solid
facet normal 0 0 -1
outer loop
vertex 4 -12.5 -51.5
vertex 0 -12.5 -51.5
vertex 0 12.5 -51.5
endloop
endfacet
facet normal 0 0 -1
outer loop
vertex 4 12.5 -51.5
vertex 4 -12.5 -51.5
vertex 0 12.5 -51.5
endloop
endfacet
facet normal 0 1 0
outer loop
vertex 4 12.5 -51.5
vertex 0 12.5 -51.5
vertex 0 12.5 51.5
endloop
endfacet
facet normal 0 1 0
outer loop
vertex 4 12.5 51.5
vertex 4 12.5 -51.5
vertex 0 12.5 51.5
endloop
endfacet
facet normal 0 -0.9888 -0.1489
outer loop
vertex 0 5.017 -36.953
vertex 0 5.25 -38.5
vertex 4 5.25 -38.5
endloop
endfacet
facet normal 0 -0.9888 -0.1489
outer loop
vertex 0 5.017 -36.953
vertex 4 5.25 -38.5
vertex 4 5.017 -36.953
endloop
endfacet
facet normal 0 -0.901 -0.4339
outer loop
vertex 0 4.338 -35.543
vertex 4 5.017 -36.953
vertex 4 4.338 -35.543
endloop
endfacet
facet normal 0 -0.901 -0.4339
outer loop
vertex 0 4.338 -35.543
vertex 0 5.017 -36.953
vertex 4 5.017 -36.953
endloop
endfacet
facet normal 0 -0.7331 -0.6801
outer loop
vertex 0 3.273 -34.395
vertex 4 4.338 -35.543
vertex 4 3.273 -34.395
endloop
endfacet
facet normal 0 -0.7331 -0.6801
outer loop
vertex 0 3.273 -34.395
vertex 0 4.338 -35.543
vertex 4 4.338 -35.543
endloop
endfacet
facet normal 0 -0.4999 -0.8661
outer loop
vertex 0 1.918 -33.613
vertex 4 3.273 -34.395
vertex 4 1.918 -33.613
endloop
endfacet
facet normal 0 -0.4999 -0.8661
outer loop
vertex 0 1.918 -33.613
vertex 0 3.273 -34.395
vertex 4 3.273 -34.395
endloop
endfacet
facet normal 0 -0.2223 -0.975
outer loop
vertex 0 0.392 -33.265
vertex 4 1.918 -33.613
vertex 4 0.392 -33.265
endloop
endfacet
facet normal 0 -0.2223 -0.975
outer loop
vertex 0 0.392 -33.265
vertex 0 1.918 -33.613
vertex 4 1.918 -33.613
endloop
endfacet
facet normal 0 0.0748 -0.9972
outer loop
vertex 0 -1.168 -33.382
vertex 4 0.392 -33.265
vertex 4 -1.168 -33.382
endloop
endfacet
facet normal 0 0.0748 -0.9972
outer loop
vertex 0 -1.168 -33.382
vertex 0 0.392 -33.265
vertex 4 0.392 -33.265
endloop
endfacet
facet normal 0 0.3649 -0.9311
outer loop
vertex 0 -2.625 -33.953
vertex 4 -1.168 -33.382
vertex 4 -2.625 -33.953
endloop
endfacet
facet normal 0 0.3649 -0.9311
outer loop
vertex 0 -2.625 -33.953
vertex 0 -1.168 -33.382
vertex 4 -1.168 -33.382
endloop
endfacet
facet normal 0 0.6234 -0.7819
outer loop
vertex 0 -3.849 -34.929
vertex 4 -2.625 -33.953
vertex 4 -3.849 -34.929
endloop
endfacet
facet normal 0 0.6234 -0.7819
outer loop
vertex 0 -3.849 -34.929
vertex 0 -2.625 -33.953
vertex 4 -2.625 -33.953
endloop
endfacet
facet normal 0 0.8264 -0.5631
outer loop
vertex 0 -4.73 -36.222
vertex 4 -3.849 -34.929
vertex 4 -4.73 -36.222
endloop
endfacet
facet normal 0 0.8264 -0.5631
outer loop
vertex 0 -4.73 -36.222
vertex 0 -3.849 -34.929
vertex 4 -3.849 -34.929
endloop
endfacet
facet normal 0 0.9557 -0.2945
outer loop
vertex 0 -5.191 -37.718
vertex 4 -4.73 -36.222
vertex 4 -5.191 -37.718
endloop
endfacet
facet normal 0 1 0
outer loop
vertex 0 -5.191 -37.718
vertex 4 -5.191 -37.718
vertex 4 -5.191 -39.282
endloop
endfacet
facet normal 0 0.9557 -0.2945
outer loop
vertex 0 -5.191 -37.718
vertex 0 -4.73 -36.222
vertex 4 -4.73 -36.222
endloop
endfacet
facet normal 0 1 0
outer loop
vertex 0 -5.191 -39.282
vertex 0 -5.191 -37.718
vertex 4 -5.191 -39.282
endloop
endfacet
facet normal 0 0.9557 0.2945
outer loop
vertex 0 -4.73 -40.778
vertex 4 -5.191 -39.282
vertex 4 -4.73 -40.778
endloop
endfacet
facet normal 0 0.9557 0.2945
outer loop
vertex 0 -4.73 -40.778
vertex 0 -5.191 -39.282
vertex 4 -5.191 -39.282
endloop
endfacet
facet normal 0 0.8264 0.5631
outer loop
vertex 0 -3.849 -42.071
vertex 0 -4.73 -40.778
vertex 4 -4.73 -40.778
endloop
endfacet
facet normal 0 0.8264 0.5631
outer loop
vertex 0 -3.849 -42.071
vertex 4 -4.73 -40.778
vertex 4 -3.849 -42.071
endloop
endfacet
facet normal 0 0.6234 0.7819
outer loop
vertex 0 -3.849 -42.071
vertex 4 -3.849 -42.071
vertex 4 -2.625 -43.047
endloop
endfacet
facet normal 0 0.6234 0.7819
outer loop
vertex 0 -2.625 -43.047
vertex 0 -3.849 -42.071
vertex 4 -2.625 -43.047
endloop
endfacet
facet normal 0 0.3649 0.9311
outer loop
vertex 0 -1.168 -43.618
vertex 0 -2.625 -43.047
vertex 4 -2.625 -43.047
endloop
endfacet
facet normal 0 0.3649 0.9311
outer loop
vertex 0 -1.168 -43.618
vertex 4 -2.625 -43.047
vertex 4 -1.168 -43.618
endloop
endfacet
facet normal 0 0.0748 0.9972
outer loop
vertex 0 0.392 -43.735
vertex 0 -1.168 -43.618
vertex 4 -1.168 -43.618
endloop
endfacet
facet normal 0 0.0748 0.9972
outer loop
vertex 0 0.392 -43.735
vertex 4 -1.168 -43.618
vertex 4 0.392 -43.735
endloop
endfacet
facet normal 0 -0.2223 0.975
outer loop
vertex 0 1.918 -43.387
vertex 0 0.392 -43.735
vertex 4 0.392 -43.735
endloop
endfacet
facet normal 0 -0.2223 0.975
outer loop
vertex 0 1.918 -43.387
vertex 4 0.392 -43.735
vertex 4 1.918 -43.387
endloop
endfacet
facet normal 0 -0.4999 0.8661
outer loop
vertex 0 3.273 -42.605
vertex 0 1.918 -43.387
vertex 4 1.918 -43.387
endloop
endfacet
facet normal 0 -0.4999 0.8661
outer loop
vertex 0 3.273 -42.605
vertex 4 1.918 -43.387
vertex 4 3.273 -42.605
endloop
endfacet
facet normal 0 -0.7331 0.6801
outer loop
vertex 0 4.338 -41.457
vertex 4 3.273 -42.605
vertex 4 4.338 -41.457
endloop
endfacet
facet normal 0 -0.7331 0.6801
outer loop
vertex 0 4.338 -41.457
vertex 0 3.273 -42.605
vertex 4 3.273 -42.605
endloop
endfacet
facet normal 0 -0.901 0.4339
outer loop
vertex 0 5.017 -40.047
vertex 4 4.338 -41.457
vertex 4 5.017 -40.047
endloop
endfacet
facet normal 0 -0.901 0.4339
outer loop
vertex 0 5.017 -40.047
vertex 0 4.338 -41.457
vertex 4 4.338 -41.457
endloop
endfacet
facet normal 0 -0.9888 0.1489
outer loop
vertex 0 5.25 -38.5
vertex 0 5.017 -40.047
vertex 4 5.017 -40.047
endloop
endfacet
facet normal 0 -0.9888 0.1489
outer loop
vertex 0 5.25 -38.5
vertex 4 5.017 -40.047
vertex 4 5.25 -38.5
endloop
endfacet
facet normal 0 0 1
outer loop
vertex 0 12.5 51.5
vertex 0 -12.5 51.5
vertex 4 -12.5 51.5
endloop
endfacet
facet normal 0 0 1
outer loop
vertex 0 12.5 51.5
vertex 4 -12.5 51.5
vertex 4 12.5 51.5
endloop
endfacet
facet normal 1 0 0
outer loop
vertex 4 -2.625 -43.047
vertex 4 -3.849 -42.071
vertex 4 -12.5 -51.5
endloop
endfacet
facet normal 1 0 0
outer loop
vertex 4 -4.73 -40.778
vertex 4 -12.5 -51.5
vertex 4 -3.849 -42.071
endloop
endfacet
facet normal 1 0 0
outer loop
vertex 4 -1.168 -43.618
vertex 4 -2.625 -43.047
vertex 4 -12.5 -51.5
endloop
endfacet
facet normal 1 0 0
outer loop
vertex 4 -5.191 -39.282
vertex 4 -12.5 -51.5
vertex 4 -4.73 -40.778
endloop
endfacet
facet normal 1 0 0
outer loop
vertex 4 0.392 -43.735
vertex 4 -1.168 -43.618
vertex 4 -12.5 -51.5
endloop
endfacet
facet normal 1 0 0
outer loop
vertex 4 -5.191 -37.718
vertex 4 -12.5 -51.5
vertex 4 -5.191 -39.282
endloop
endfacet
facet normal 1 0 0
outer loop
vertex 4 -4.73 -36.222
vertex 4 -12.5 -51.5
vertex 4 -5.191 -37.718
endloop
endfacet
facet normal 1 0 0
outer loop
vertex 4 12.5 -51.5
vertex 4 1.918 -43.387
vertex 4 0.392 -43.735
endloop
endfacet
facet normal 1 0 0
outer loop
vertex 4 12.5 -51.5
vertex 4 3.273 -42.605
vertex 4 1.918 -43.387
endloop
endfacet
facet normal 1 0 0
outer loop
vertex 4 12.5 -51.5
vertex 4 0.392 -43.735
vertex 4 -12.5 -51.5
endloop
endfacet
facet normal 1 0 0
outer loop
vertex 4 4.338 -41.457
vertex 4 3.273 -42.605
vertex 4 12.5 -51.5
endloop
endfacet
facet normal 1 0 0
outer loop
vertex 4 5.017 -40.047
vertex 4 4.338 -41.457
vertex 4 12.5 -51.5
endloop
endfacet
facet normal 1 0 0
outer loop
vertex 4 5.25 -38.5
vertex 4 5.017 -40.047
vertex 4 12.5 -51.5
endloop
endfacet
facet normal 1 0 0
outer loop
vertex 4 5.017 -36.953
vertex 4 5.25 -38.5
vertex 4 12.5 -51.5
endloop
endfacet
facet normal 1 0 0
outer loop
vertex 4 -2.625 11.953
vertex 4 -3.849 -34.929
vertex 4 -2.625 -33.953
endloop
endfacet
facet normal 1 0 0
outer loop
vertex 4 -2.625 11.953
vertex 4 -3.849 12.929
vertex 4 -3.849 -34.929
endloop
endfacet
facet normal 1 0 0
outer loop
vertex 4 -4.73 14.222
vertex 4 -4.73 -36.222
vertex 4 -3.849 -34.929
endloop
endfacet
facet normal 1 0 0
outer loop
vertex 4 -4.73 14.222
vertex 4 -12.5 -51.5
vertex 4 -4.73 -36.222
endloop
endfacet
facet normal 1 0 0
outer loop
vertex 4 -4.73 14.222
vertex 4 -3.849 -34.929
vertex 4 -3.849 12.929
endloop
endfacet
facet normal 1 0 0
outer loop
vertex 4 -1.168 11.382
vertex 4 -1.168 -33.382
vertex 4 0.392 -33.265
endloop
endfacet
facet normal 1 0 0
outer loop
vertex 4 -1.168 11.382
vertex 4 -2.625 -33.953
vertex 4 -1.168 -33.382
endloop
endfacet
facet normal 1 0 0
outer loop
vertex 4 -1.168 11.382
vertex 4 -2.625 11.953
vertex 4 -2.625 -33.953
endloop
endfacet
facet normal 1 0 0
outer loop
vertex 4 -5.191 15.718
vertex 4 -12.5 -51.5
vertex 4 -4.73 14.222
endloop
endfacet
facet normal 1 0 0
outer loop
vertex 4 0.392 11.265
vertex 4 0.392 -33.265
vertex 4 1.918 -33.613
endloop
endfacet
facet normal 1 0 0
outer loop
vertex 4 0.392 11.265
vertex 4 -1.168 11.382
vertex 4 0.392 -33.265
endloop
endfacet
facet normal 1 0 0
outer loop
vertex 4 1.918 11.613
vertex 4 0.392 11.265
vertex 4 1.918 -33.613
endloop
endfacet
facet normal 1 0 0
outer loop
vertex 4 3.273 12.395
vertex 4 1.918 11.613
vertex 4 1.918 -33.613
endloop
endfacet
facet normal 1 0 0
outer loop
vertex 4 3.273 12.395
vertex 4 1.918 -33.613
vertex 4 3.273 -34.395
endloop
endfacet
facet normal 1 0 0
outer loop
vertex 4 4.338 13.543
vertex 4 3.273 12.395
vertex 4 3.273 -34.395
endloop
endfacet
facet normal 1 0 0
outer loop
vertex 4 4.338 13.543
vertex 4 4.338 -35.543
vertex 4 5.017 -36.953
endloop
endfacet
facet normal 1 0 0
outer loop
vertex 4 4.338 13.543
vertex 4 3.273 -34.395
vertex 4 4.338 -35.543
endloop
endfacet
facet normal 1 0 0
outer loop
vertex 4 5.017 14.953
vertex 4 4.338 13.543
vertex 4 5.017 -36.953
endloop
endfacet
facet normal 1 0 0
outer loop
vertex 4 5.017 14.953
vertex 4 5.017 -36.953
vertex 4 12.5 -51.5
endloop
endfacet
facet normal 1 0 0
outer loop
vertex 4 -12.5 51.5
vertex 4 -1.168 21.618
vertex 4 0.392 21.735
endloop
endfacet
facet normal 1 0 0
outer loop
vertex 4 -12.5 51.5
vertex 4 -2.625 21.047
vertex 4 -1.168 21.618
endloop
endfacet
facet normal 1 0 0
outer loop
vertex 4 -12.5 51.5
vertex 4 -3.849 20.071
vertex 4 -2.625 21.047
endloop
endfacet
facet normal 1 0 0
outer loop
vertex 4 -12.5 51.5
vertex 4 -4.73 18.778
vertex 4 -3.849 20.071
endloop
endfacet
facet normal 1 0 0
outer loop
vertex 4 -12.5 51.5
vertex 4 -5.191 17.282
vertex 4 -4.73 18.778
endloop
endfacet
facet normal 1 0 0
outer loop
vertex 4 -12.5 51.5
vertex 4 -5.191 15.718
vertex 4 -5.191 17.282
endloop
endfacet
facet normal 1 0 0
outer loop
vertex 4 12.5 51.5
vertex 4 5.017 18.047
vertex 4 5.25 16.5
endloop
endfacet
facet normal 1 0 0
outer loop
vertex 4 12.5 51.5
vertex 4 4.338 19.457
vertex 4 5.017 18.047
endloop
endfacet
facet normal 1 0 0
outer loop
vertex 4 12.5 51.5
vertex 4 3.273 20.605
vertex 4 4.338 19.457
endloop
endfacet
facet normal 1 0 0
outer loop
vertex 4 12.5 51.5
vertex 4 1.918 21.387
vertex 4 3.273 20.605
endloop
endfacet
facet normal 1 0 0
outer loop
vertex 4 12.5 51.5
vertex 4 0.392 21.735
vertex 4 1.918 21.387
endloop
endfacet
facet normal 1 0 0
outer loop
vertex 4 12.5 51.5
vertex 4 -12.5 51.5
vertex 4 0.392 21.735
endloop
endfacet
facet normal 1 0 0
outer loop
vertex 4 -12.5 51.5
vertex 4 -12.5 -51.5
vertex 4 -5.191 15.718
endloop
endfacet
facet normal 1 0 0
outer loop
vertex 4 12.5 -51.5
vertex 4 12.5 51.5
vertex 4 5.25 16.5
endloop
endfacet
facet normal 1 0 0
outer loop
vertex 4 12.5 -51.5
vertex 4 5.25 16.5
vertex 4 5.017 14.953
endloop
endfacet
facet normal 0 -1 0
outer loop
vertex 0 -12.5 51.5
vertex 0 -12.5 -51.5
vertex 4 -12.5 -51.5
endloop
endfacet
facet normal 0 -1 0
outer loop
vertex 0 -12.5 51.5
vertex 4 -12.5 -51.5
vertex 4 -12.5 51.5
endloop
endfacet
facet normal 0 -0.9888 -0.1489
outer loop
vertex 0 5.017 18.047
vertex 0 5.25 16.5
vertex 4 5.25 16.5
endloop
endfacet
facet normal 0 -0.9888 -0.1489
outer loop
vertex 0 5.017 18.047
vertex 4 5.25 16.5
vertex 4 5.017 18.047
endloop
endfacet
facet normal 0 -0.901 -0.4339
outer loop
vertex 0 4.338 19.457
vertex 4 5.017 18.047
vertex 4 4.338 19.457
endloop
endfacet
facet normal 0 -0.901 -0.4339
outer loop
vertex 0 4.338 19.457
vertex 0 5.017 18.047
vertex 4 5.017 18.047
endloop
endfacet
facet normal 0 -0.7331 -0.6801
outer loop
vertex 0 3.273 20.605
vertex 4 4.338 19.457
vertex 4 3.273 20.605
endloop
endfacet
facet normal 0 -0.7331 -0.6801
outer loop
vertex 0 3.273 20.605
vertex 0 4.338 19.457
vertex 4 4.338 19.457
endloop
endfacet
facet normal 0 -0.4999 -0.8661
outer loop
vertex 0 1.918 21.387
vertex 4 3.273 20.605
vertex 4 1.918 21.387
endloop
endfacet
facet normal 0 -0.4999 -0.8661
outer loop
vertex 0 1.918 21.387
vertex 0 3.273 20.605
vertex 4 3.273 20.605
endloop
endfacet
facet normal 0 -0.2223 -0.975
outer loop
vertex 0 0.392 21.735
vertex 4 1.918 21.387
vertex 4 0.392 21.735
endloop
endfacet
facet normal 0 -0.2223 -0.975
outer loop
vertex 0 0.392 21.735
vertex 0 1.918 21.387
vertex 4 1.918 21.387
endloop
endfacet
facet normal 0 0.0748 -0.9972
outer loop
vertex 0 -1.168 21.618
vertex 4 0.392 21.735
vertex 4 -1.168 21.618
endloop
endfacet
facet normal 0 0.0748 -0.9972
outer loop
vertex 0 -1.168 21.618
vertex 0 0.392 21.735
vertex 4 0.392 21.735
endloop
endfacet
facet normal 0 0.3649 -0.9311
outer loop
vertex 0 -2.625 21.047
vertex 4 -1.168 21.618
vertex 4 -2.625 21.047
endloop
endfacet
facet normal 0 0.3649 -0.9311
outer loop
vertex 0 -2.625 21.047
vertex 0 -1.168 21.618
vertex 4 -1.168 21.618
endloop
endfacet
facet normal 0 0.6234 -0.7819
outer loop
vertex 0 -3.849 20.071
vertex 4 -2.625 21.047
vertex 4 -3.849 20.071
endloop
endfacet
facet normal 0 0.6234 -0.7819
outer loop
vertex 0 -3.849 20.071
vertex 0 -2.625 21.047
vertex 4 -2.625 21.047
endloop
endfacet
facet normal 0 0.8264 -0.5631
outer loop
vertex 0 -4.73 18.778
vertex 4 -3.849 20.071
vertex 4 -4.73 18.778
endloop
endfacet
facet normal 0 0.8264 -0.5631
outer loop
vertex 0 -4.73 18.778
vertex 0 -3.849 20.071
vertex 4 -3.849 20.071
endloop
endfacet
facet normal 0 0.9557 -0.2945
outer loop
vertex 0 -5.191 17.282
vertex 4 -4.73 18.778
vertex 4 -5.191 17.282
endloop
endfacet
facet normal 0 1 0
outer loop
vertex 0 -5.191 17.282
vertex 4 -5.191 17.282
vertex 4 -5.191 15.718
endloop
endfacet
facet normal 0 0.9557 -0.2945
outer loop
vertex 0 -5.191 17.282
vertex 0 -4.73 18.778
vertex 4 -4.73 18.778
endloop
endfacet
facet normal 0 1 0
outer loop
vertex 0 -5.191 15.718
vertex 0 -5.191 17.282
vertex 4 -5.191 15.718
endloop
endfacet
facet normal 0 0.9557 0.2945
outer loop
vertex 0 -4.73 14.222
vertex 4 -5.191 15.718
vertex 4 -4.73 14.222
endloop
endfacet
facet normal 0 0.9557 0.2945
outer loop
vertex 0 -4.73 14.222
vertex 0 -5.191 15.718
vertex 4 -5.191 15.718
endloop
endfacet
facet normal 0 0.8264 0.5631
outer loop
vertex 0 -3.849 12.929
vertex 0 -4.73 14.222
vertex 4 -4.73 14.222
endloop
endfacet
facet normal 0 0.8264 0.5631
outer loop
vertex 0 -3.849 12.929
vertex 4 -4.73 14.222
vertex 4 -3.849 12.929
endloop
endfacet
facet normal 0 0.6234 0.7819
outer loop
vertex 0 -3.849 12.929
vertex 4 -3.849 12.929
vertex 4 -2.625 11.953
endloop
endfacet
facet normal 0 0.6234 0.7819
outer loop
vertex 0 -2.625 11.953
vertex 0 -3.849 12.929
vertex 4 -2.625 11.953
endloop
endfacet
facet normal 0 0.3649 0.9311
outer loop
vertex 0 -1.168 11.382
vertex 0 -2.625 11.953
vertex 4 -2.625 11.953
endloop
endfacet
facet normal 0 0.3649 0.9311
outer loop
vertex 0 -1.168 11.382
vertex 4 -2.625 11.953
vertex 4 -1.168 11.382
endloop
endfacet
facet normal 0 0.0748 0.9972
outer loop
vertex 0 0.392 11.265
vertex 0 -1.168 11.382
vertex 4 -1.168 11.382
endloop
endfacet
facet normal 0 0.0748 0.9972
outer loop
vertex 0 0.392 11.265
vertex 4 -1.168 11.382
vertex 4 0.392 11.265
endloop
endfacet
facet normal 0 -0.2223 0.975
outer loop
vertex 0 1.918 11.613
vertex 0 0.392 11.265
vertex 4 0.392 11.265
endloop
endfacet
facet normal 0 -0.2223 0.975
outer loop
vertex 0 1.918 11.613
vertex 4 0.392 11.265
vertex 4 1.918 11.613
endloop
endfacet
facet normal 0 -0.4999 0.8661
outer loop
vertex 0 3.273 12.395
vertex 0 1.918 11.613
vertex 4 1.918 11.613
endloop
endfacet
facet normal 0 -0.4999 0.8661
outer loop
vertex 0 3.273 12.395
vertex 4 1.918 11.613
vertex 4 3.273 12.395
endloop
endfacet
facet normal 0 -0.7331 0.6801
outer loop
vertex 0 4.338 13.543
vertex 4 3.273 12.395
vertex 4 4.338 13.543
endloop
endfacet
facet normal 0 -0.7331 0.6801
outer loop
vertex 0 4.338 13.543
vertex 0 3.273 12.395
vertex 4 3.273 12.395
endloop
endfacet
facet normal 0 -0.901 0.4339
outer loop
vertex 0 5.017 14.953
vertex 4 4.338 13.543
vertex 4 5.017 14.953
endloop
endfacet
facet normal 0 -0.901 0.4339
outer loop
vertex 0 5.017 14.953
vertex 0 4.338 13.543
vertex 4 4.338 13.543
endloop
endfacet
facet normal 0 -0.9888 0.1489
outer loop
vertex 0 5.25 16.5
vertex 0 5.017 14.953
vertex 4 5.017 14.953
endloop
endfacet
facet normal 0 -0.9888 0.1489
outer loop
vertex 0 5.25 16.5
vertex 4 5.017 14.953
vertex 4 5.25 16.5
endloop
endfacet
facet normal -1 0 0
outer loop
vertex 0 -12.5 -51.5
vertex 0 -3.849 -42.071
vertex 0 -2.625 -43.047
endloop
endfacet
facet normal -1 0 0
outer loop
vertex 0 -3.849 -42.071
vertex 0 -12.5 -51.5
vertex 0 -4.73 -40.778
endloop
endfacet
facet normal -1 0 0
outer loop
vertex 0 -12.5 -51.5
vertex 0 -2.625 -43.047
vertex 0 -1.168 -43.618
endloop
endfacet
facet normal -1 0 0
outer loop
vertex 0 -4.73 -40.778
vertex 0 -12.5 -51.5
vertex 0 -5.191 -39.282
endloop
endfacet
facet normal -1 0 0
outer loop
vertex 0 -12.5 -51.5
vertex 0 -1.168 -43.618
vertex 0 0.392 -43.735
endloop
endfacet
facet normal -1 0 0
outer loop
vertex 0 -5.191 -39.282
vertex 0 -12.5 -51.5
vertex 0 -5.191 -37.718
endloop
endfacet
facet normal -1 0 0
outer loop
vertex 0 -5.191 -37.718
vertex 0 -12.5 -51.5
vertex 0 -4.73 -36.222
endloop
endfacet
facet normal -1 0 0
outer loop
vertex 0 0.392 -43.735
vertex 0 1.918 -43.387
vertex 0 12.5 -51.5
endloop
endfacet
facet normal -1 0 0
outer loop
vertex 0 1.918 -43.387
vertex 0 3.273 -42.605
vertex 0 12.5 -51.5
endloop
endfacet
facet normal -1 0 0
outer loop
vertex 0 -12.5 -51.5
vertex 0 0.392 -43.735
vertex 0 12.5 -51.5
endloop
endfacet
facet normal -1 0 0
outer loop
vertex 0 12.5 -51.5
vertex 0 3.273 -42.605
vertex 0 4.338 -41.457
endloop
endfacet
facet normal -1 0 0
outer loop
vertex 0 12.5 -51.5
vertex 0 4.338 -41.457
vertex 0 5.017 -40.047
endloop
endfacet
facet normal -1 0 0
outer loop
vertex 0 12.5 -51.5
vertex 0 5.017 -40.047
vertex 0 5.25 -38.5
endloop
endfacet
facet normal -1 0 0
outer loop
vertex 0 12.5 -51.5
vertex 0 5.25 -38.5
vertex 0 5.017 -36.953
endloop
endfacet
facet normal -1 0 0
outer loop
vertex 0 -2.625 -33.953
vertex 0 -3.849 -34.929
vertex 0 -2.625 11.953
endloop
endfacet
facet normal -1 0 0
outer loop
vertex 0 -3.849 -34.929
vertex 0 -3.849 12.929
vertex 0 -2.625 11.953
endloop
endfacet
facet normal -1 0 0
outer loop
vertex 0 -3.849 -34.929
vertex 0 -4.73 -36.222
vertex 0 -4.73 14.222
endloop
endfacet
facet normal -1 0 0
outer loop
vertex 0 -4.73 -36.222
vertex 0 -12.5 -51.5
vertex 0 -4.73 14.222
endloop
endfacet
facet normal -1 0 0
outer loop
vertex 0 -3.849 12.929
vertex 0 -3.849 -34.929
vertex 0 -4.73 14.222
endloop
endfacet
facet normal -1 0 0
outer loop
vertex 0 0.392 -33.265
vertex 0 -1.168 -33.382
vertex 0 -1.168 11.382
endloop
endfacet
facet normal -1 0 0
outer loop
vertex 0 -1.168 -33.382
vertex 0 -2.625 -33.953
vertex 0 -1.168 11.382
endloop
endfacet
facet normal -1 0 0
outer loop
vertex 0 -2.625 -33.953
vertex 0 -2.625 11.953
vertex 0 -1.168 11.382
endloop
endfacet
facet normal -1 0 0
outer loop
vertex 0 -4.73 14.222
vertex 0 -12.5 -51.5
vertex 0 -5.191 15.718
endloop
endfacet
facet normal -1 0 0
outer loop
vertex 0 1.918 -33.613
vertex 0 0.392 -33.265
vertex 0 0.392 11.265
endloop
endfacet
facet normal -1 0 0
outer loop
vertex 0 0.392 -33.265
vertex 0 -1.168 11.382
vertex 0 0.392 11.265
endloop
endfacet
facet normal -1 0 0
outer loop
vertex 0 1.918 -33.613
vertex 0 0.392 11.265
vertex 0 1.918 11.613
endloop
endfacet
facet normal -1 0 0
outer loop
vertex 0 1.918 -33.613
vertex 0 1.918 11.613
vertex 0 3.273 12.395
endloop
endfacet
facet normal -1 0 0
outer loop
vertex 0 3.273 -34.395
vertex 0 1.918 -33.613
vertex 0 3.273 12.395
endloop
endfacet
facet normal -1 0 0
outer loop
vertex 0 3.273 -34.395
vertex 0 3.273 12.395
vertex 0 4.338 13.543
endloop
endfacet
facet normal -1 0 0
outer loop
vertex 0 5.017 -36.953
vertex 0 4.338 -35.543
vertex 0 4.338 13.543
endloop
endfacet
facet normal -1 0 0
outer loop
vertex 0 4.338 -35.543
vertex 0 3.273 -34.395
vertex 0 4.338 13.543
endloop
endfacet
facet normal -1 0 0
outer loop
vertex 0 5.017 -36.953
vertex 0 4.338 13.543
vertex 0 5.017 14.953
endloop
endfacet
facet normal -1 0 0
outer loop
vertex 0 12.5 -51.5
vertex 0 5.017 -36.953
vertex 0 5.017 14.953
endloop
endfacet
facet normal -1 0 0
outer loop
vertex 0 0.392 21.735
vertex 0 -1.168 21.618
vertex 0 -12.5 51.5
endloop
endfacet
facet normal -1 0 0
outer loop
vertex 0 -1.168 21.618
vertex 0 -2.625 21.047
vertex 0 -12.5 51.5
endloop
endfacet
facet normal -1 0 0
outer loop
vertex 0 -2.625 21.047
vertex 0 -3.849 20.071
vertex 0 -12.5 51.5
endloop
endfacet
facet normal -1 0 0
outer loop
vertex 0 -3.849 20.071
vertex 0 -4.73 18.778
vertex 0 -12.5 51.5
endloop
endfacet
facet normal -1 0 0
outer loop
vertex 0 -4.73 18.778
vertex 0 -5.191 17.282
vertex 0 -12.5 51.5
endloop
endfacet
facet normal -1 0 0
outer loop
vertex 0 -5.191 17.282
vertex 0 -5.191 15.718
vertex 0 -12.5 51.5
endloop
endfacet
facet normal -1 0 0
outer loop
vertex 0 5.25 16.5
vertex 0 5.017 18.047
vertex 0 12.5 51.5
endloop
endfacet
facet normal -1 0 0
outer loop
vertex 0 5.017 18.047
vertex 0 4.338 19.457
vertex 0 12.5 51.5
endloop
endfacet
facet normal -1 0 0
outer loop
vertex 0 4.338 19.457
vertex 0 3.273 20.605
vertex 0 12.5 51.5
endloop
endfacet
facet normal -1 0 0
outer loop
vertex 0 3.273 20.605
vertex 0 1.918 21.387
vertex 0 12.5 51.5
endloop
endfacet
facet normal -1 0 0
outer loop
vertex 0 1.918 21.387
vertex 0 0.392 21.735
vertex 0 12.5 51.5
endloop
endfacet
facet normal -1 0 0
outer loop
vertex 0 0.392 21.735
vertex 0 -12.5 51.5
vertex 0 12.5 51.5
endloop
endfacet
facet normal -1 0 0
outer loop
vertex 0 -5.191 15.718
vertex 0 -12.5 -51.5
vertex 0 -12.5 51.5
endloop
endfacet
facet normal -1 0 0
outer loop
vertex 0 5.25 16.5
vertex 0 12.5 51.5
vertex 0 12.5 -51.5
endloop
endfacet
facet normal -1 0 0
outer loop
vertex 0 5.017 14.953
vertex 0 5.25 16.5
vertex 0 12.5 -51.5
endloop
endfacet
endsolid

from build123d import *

# Parameters (mm, degrees)
F0_W     = 25
F0_H     = 103
F0_R     = 5.25
F1_DEPTH = 4


with BuildPart() as f1:
    # F0 (on Right) → F1 (new body)
    with BuildSketch(Plane.YZ):
        Rectangle(F0_W, F0_H)
        with Locations((0, -38.5)):
            Circle(F0_R, mode=Mode.SUBTRACT)
        with Locations((0, 16.5)):
            Circle(F0_R, mode=Mode.SUBTRACT)
    extrude(amount=F1_DEPTH)


solid = f1.part
